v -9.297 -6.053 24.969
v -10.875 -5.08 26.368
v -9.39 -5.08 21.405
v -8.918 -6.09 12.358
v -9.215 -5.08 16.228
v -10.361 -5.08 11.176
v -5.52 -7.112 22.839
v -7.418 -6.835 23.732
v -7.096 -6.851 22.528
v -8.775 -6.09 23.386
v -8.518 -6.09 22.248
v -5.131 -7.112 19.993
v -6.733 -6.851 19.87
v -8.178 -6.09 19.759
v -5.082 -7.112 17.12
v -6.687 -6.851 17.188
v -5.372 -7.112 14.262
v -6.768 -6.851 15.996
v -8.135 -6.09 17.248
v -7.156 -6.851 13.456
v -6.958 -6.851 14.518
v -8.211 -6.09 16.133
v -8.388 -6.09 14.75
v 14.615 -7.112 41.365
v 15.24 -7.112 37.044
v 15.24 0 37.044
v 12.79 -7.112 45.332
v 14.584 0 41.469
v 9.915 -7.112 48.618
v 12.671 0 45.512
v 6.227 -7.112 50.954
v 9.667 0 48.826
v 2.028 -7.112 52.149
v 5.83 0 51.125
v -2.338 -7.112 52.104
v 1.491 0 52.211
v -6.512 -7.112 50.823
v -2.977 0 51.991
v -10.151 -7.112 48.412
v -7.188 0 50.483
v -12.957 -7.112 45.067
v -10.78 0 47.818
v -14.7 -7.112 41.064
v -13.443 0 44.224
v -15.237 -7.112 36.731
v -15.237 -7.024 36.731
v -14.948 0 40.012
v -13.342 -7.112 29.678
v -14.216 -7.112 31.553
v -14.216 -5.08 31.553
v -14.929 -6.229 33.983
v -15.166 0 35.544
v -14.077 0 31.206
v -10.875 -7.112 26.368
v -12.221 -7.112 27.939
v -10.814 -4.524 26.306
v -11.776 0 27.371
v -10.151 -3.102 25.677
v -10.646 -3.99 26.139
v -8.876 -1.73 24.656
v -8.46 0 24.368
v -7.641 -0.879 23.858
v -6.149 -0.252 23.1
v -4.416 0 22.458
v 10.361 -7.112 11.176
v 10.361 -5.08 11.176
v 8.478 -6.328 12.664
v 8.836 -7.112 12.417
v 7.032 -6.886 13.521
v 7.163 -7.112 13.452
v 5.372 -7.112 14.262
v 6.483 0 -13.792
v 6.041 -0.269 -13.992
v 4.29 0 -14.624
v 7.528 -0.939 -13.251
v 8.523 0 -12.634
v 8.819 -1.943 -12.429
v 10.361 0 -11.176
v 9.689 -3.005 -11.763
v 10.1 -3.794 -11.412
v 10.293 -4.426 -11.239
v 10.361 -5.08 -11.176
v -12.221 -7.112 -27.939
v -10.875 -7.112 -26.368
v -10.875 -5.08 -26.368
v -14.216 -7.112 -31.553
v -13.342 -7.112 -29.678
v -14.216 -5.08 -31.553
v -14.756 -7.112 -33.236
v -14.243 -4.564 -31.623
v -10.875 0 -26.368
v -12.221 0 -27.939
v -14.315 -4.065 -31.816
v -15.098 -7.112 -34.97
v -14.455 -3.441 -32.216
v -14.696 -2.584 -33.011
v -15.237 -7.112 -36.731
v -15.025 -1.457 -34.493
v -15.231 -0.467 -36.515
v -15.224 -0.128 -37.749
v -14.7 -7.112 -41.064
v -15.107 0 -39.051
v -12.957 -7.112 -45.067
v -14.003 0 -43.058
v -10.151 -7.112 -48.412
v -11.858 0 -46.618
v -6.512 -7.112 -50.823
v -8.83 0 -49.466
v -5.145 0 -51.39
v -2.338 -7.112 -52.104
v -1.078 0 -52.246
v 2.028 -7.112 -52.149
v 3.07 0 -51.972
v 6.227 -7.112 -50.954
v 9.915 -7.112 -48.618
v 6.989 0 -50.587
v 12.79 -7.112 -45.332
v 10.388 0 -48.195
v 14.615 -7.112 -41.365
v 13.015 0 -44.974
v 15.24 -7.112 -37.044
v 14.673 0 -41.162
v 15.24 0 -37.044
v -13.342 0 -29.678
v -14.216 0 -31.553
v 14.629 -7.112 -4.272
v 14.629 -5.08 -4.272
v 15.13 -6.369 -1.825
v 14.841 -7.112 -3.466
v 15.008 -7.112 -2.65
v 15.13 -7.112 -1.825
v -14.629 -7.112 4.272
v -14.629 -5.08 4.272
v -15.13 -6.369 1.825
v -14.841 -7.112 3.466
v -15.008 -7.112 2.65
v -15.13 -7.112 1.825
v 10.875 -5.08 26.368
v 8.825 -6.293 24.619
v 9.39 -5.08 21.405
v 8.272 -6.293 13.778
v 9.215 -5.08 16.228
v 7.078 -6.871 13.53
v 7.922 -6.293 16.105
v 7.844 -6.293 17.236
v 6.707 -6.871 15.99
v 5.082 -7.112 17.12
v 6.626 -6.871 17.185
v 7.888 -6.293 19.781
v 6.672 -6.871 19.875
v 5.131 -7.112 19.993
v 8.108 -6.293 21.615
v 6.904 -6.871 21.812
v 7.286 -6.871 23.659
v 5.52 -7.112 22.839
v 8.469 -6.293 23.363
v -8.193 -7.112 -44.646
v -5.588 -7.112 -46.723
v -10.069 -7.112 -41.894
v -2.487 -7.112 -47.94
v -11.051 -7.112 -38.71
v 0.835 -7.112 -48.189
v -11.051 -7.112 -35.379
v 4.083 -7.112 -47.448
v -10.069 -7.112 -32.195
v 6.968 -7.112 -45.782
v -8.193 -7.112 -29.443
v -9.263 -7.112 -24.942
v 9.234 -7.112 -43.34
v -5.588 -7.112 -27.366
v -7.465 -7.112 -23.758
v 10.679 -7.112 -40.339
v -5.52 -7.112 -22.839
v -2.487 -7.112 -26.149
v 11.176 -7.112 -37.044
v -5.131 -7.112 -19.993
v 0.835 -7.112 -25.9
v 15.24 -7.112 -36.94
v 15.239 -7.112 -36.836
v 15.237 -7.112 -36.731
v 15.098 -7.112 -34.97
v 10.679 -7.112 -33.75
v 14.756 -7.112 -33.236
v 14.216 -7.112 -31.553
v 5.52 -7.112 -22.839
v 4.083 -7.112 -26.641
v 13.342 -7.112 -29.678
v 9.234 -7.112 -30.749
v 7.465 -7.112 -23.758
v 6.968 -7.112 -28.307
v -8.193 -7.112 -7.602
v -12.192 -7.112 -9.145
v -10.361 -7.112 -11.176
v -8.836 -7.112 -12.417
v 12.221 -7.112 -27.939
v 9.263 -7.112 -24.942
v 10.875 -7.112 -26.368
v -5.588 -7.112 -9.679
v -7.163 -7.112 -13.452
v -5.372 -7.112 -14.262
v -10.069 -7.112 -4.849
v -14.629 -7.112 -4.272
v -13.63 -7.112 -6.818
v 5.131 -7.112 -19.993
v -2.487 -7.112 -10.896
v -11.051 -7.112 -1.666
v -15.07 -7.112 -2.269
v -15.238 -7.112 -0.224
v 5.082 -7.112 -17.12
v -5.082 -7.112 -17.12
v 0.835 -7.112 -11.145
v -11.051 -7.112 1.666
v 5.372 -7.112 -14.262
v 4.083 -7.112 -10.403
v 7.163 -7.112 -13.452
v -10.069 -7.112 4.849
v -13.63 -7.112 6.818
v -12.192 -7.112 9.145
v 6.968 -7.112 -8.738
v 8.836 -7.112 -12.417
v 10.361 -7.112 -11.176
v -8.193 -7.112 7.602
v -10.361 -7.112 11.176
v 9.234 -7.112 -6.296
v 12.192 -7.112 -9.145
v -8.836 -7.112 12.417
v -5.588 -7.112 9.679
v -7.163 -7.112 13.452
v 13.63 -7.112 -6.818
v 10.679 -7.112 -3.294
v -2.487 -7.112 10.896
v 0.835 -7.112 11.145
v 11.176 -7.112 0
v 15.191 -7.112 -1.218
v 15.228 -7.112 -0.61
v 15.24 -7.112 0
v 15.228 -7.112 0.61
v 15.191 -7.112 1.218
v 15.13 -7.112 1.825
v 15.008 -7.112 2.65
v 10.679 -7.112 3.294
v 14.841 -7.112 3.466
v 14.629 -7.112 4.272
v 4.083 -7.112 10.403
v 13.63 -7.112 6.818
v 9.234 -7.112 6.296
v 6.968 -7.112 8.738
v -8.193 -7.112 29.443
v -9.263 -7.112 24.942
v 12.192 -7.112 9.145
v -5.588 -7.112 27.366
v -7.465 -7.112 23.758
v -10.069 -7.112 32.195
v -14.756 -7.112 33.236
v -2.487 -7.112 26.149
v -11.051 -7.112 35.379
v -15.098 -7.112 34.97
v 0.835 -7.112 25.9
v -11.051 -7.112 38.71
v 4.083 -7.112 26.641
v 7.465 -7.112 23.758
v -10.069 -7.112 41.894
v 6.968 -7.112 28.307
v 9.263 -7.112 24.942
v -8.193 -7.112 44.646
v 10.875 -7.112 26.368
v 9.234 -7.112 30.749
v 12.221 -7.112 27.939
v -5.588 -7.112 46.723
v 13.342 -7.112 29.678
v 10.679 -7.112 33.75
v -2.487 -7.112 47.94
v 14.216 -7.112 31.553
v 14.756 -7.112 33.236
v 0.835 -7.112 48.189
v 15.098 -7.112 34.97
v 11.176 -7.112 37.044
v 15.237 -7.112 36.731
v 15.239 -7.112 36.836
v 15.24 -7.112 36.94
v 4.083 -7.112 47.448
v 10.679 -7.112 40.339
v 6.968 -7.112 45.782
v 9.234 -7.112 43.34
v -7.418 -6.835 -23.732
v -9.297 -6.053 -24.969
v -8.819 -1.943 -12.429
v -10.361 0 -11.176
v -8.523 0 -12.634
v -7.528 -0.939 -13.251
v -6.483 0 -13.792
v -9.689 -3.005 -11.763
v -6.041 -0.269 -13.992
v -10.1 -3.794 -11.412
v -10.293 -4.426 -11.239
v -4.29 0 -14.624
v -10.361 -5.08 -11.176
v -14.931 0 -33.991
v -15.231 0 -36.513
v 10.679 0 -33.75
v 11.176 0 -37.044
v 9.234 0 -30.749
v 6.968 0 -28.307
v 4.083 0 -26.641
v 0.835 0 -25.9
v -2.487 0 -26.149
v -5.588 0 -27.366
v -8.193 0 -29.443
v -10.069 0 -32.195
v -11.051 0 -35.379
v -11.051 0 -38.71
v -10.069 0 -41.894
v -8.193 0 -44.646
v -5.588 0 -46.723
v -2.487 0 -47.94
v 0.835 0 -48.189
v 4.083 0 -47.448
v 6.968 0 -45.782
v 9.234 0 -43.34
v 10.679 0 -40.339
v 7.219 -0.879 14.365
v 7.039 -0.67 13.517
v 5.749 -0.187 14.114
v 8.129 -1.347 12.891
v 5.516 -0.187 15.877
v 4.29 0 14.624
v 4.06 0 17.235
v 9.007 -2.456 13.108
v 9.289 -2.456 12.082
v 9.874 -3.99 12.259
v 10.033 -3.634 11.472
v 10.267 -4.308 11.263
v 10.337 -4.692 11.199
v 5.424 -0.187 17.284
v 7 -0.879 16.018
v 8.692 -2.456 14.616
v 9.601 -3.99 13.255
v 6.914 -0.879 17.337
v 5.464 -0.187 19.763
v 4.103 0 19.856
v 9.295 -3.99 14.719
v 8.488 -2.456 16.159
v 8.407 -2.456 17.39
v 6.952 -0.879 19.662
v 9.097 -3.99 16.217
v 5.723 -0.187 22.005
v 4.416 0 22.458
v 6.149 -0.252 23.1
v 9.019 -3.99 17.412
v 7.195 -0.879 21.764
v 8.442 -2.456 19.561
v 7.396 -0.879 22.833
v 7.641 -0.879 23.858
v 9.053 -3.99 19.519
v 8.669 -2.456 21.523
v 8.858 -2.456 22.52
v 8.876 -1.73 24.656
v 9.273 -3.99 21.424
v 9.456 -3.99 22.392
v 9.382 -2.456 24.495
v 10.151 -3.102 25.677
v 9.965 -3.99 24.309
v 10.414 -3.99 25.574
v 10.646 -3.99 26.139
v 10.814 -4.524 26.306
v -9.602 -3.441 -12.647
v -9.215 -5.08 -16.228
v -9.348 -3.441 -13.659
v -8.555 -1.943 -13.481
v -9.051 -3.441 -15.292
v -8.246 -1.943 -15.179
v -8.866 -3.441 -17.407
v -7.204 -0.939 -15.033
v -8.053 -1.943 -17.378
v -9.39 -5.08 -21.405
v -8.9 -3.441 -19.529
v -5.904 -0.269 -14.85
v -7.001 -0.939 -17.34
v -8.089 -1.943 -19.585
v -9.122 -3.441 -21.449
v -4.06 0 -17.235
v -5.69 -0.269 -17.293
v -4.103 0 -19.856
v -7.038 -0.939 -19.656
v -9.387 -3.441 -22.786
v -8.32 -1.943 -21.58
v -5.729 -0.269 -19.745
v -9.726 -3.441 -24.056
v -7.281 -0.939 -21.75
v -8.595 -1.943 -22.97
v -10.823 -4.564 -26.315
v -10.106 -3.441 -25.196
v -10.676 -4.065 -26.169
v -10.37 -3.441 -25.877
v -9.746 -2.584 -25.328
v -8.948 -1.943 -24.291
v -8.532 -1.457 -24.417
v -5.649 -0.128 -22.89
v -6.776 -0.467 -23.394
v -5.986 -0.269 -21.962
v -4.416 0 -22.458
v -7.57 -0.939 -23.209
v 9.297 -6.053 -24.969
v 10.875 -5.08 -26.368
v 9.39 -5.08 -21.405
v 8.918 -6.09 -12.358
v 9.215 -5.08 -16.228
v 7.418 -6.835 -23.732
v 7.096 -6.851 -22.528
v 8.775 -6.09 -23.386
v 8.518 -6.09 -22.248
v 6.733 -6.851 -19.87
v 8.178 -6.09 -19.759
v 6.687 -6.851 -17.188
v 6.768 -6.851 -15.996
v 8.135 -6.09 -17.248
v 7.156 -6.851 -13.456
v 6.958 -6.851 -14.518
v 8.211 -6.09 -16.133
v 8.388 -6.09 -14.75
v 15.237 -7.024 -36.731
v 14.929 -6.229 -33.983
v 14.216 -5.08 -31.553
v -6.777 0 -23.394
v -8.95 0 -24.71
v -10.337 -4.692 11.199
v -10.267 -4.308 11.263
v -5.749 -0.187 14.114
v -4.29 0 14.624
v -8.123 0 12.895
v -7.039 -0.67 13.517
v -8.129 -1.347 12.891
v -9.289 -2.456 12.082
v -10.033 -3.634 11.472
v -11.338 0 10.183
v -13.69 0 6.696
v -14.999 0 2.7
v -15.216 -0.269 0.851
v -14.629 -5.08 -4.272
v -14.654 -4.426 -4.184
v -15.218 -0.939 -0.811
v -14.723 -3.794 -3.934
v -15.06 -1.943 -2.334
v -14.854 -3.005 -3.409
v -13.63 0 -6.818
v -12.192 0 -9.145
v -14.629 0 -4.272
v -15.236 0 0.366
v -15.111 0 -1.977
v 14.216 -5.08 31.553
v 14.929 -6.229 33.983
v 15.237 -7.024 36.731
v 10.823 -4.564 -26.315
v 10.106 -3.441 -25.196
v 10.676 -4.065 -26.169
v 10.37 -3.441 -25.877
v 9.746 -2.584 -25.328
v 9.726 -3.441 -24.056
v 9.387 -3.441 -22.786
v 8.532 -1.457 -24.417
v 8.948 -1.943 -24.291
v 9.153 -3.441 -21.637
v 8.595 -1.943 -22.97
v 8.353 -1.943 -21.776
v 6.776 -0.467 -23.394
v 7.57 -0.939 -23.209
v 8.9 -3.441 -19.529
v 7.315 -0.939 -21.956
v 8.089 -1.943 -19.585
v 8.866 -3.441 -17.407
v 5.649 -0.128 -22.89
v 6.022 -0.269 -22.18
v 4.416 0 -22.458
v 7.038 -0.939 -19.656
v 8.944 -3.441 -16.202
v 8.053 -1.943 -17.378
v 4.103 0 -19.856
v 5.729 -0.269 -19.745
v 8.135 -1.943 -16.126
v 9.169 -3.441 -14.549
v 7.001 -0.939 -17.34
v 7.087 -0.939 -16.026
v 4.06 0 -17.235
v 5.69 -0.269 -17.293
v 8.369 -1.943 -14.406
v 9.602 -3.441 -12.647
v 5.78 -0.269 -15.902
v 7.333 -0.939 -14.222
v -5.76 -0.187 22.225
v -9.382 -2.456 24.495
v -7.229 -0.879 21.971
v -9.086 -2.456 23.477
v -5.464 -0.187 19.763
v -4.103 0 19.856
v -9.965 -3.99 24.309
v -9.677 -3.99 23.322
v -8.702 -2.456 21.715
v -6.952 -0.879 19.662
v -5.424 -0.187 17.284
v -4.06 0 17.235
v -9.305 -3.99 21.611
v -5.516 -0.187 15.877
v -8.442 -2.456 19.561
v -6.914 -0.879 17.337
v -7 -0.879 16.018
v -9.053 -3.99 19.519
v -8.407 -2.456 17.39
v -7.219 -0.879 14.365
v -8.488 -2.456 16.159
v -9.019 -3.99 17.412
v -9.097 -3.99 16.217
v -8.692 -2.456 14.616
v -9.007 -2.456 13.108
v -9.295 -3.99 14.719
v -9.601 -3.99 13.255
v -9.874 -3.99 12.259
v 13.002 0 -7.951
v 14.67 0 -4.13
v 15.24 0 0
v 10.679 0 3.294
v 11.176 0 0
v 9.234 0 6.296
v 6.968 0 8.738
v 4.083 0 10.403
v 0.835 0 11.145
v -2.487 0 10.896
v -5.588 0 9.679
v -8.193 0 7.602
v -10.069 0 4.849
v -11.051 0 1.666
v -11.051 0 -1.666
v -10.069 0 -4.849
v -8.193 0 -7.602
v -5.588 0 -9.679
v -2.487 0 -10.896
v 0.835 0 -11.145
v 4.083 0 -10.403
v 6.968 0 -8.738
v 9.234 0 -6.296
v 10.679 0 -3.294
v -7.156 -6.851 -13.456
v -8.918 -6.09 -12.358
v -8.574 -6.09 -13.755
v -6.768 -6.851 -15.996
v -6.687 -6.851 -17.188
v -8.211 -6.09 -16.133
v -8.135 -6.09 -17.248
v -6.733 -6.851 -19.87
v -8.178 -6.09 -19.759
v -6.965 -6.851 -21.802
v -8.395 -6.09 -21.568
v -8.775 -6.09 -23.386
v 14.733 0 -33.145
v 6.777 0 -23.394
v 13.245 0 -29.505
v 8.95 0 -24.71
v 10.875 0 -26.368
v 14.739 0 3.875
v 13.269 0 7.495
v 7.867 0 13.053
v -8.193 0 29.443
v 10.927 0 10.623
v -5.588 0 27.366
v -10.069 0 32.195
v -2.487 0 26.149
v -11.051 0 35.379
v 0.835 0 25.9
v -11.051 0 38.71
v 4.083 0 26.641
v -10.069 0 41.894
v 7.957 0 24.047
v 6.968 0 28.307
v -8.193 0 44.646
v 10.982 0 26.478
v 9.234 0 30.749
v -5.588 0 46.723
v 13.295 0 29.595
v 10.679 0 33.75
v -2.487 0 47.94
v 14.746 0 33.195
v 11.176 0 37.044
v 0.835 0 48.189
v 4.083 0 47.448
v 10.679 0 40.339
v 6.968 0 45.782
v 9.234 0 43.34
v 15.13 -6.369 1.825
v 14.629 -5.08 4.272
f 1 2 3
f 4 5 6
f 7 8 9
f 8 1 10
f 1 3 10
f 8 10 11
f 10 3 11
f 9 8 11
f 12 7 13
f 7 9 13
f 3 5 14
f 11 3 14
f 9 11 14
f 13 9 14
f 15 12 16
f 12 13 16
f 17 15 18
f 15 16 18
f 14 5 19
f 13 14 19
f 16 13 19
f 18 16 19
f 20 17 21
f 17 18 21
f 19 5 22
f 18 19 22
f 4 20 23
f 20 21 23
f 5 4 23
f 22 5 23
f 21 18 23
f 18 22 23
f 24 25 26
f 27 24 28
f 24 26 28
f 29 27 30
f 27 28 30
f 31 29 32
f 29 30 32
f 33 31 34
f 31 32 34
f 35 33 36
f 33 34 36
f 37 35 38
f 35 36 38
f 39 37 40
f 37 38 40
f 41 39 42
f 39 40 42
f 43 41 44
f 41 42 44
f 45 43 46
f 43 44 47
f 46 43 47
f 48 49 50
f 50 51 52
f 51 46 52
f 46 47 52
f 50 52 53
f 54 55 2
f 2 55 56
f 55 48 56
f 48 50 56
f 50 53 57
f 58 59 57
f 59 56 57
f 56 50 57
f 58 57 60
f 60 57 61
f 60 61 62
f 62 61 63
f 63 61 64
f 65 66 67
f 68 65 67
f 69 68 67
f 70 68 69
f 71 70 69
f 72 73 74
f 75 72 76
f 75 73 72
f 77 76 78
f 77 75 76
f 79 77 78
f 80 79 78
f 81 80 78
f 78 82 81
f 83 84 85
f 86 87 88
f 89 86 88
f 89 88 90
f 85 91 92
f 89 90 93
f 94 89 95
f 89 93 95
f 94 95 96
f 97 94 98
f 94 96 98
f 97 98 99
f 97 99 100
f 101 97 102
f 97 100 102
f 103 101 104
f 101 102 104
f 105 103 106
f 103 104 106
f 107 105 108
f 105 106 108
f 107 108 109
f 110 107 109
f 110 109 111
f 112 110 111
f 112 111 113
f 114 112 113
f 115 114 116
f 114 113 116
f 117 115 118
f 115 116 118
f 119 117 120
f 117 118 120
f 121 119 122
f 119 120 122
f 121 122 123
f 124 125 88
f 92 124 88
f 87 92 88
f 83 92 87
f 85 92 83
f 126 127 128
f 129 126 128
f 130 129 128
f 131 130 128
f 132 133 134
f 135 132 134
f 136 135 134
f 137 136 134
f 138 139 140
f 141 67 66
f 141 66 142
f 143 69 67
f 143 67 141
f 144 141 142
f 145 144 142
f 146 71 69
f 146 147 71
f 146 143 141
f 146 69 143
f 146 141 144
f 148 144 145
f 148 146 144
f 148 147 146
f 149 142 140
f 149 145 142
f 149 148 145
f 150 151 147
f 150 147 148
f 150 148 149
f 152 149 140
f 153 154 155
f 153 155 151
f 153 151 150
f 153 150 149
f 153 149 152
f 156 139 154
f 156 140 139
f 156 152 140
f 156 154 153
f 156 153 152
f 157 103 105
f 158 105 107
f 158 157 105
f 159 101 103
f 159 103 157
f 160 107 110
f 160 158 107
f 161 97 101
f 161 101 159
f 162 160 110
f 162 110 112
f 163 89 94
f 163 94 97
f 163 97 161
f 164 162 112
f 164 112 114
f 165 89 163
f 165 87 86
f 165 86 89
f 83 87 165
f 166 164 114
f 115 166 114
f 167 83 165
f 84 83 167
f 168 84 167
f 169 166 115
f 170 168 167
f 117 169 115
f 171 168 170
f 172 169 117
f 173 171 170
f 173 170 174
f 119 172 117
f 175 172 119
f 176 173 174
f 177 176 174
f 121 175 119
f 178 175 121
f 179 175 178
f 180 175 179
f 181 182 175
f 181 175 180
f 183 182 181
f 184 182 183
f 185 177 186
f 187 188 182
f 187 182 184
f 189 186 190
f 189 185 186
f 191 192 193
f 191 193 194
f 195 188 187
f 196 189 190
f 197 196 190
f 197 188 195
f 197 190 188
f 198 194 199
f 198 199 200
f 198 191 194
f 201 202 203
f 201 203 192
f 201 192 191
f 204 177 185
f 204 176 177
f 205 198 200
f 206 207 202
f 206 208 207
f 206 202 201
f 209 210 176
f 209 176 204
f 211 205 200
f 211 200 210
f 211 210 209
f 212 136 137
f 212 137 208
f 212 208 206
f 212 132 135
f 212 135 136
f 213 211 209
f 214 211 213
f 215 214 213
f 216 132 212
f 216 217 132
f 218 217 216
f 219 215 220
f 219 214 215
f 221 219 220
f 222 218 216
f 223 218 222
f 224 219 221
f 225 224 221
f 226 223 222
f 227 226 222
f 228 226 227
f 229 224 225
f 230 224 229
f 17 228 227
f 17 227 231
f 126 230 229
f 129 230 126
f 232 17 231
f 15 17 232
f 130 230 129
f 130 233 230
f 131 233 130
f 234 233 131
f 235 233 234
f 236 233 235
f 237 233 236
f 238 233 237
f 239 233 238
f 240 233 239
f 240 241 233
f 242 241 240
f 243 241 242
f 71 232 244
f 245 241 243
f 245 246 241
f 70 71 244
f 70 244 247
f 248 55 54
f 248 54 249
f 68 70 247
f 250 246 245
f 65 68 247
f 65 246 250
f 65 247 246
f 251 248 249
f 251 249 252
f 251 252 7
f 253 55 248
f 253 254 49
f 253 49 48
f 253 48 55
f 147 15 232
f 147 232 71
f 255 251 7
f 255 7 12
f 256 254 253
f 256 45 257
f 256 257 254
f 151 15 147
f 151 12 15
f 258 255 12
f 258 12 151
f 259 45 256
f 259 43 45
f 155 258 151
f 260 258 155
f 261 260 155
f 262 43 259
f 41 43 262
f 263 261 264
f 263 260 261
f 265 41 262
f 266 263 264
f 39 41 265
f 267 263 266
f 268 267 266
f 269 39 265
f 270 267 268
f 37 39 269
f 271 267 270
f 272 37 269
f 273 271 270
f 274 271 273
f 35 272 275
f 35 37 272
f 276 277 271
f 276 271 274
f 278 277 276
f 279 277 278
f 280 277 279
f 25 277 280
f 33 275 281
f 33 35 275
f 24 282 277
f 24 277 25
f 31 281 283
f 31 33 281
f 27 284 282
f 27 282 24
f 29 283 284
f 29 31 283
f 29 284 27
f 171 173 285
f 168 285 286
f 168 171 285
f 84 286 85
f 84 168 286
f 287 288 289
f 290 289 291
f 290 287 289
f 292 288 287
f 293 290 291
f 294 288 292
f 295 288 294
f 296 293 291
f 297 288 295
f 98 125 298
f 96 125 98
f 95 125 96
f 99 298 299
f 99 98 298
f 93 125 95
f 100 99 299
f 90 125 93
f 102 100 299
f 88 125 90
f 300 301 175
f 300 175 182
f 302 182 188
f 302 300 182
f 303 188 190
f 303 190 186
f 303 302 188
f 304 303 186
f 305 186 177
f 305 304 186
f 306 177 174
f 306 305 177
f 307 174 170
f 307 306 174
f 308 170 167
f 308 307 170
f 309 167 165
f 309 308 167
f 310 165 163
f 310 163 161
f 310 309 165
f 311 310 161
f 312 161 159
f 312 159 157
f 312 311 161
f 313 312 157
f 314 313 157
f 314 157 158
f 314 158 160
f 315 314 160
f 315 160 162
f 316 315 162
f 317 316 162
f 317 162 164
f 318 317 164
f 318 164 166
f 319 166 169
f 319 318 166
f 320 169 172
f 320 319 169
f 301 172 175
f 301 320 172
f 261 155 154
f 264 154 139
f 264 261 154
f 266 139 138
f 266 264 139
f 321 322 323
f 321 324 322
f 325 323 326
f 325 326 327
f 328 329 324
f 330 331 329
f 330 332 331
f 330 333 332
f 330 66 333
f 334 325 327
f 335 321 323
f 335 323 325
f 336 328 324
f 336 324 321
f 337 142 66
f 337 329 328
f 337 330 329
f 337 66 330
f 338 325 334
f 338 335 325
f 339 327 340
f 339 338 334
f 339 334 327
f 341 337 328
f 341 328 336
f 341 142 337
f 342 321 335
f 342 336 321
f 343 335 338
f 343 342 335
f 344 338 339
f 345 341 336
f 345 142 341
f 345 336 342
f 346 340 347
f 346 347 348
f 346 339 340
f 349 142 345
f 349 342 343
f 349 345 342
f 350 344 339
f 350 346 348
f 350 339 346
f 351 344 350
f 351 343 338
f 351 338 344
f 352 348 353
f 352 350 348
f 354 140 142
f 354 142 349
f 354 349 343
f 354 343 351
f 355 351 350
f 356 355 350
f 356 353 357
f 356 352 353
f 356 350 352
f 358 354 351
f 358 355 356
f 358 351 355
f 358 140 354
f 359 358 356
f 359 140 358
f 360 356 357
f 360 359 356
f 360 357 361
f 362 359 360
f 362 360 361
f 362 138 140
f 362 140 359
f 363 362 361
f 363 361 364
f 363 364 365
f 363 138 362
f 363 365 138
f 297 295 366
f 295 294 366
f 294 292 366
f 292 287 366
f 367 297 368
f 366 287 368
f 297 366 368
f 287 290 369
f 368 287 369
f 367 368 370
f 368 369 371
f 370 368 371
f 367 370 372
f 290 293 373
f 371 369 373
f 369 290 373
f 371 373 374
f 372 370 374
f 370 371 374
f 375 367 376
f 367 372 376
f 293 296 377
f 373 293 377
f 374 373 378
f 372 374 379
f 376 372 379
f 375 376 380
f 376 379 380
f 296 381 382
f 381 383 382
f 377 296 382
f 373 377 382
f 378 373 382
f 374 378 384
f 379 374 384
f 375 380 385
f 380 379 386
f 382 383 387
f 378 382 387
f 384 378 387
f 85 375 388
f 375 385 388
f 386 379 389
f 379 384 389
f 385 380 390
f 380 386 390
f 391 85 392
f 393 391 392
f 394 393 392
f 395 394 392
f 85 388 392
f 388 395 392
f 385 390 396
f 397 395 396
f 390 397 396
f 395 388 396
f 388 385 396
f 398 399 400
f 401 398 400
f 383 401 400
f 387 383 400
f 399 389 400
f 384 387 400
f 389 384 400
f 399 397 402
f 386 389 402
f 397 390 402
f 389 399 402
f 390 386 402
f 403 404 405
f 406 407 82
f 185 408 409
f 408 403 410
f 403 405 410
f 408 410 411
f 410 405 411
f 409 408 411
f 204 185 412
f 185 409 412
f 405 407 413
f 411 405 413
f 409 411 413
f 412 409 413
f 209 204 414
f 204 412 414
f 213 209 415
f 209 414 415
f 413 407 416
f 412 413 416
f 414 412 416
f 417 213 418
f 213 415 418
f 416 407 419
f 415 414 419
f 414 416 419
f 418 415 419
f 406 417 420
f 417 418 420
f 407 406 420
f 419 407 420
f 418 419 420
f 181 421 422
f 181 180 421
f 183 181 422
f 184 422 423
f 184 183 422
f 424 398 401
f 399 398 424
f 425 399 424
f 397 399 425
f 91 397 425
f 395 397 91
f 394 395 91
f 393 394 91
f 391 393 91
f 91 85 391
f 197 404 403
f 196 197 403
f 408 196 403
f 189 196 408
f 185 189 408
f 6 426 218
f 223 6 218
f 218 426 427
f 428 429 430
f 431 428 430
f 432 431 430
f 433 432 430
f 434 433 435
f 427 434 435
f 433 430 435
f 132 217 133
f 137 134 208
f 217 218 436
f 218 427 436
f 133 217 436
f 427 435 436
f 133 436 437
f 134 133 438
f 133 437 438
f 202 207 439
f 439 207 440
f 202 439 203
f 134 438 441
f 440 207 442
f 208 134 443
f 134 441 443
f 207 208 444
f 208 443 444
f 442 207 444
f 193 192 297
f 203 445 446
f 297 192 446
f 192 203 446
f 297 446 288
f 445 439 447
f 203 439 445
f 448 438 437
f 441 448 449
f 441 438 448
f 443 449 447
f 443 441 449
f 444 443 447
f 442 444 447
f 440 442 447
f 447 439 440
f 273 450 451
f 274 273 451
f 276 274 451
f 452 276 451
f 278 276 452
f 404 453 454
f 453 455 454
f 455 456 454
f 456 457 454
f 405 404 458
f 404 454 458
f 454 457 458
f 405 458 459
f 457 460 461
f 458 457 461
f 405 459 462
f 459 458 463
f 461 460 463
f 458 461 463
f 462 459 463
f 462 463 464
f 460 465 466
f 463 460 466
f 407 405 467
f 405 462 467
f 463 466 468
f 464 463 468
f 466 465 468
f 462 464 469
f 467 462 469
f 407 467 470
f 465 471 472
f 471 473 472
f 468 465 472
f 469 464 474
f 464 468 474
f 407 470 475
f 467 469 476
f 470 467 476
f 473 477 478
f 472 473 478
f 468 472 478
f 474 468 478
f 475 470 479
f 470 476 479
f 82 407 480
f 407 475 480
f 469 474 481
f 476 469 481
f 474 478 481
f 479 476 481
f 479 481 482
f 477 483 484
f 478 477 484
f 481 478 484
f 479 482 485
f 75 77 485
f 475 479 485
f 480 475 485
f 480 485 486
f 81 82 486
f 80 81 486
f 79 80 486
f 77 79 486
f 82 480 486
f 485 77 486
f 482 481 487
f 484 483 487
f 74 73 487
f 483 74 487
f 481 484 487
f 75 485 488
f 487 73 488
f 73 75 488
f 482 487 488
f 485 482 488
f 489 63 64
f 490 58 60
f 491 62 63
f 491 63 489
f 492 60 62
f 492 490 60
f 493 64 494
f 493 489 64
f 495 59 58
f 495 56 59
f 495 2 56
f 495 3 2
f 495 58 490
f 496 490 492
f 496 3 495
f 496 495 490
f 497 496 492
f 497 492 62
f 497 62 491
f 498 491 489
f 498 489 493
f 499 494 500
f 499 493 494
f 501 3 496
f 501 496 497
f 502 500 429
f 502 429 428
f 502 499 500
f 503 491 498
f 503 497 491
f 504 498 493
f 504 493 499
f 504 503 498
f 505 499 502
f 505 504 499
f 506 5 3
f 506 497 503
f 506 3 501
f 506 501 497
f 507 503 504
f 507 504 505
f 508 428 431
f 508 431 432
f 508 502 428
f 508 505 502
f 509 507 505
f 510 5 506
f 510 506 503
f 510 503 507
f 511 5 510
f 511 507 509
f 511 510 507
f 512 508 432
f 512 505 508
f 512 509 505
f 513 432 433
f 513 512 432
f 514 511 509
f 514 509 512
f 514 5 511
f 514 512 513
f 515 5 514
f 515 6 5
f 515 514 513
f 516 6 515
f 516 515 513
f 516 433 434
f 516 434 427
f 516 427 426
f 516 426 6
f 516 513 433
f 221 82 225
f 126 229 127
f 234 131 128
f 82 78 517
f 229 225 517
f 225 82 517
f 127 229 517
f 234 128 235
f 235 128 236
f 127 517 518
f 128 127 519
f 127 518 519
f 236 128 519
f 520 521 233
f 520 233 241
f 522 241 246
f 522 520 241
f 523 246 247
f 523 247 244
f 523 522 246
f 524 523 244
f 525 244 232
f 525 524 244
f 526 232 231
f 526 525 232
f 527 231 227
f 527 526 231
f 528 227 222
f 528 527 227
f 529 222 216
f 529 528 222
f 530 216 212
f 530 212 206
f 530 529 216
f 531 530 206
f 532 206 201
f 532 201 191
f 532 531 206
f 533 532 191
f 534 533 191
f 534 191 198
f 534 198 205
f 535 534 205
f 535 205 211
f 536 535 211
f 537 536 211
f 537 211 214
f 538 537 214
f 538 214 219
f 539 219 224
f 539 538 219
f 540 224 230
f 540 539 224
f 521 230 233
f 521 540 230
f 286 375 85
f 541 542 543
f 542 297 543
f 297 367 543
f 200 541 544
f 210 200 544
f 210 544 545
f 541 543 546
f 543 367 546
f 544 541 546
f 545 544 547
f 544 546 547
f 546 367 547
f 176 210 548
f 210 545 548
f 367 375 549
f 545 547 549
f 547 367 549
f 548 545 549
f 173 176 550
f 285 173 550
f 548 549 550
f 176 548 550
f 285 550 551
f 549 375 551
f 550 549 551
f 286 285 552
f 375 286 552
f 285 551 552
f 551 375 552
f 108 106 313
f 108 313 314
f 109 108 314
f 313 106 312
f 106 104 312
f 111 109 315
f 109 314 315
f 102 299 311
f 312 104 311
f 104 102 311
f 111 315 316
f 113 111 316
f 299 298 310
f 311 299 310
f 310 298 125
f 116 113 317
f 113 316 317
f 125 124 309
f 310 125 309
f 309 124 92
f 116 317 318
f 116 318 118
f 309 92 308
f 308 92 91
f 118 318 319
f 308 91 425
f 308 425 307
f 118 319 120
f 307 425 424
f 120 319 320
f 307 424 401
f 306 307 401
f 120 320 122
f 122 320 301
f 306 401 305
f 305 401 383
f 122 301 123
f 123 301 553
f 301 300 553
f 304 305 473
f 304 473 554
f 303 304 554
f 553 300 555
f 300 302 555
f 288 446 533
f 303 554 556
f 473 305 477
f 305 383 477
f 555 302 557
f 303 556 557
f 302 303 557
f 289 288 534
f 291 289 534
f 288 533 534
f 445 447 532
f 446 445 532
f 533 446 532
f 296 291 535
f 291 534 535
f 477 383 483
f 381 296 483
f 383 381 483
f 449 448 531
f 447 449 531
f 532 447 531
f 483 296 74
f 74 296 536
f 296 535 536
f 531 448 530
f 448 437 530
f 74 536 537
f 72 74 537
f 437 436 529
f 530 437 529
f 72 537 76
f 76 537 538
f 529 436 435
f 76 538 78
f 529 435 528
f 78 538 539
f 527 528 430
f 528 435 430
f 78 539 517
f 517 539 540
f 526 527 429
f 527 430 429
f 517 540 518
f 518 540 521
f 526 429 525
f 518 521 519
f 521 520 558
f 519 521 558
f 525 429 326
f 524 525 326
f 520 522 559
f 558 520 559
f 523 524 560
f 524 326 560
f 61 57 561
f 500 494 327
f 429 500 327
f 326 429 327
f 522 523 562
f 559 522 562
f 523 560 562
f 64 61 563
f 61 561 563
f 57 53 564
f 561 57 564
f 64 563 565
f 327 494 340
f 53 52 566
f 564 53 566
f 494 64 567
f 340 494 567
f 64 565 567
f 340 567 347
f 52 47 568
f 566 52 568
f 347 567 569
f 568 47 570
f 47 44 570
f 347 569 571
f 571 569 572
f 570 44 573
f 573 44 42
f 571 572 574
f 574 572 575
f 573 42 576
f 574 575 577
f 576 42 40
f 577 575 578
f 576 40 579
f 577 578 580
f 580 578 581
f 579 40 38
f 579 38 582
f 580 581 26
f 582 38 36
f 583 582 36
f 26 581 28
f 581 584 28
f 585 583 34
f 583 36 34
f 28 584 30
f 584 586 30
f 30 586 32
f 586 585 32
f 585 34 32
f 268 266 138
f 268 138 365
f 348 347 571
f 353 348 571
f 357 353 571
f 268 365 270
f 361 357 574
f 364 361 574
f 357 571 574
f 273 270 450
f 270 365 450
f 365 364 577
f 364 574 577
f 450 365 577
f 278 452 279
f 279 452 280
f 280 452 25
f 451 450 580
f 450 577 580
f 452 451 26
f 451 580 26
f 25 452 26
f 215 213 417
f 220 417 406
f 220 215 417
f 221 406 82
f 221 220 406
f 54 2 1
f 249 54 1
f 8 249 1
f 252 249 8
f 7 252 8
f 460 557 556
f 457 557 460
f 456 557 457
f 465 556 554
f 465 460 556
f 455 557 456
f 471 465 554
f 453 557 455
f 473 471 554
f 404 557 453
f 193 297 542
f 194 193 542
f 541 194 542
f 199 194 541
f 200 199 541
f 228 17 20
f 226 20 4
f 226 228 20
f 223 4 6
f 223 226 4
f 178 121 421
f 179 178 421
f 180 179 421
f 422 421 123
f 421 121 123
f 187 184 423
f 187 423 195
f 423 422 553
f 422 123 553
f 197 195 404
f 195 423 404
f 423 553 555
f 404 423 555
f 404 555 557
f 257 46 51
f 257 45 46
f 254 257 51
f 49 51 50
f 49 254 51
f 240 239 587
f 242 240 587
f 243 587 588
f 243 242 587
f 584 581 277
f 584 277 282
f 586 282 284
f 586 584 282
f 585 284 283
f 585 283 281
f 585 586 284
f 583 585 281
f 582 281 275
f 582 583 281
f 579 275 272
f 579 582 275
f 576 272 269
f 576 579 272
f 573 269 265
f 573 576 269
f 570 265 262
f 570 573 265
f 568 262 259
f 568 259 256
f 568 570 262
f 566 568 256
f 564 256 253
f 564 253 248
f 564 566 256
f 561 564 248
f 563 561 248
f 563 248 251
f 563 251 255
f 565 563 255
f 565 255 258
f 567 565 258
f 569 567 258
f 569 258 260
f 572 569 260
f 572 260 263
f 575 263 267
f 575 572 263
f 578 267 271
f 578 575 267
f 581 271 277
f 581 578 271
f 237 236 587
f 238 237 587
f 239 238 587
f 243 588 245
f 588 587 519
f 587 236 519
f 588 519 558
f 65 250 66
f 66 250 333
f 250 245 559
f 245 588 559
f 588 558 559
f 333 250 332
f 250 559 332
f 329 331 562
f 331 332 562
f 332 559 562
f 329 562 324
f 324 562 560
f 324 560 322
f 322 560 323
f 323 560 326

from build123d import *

# Parameters (mm, degrees)
F0_R         = 11.176
F1_DEPTH     = 7.112
F2_T4_ANGLE  = 116.1586222886
F2_S5_R      = 15.24
F2_T6_DEPTH  = 30
F2_S7_R      = 15.24
F2_T8_DEPTH  = 30
F2_T12_ANGLE = 116.1586222886
F2_S13_R     = 15.24
F2_T14_DEPTH = 30
F2_S15_R     = 15.24
F2_T16_DEPTH = 30
F3_R         = 5.08
F4_T4_ANGLE  = 101.759749901
F4_S5_R      = 15.24
F4_T6_DEPTH  = 23
F4_S7_R      = 15.24
F4_T8_DEPTH  = 23
F4_T12_ANGLE = 101.7597499017
F4_S13_R     = 15.24
F4_T14_DEPTH = 27
F4_S15_R     = 15.24
F4_T16_DEPTH = 27
F4_T20_ANGLE = 101.7597499014
F4_S21_R     = 15.24
F4_T22_DEPTH = 27
F4_S23_R     = 15.24
F4_T24_DEPTH = 27
F4_T28_ANGLE = 101.7597499014
F4_S29_R     = 15.24
F4_T30_DEPTH = 27
F4_S31_R     = 15.24
F4_T32_DEPTH = 27


# Not quite as in the source:
# - a fillet or chamfer that OpenCascade refuses, or shapes differently, is made with other operations: its cross-section is extruded or revolved along the edge and cut away or added


with BuildPart() as f1:
    # F0 (on Front) → F1 (new body)
    with BuildSketch(Plane.XZ):
        with BuildLine():
            ThreePointArc((10.3608125449, -11.1763662883), (13.9670394713, -6.0974919769), (15.24, 0))
            ThreePointArc((15.24, 0), (13.9670394713, 6.0974919769), (10.3608125449, 11.1763662883))
            ThreePointArc((10.3608125449, 11.1763662883), (0, 15.24), (-10.3608125449, 11.1763662883))
            ThreePointArc((-10.3608125449, 11.1763662883), (-15.24, 0), (-10.3608125449, -11.1763662883))
            ThreePointArc((-10.3608125449, -11.1763662883), (0, -15.24), (10.3608125449, -11.1763662883))
        make_face()
        Circle(F0_R, mode=Mode.SUBTRACT)
        with BuildLine():
            ThreePointArc((-10.3608125449, 11.1763662883), (0, 15.24), (10.3608125449, 11.1763662883))
            ThreePointArc((10.3608125449, 11.1763662883), (9.1357508424, 18.8221602784), (10.8748760535, 26.3676480303))
            ThreePointArc((10.8748760535, 26.3676480303), (0, 21.8044767177), (-10.8748760535, 26.3676480303))
            ThreePointArc((-10.8748760535, 26.3676480303), (-9.1357508424, 18.8221602784), (-10.3608125449, 11.1763662883))
        make_face()
        with BuildLine():
            ThreePointArc((10.8748760535, -26.3676480303), (9.1357508424, -18.8221602784), (10.3608125449, -11.1763662883))
            ThreePointArc((10.3608125449, -11.1763662883), (0, -15.24), (-10.3608125449, -11.1763662883))
            ThreePointArc((-10.3608125449, -11.1763662883), (-9.1357508424, -18.8221602784), (-10.8748760535, -26.3676480303))
            ThreePointArc((-10.8748760535, -26.3676480303), (0, -21.8044767177), (10.8748760535, -26.3676480303))
        make_face()
        with BuildLine():
            ThreePointArc((-10.8748760535, 26.3676480303), (0, 21.8044767177), (10.8748760535, 26.3676480303))
            ThreePointArc((10.8748760535, 26.3676480303), (14.1065713598, 31.2771337877), (15.24, 37.0444767177))
            ThreePointArc((15.24, 37.0444767177), (-5.76734293, 51.1510480775), (-10.8748760535, 26.3676480303))
        make_face()
        with Locations((0, 37.0444767177)):
            Circle(F0_R, mode=Mode.SUBTRACT)
        with BuildLine():
            ThreePointArc((15.24, -37.0444767177), (14.1065713598, -31.2771337877), (10.8748760535, -26.3676480303))
            ThreePointArc((10.8748760535, -26.3676480303), (0, -21.8044767177), (-10.8748760535, -26.3676480303))
            ThreePointArc((-10.8748760535, -26.3676480303), (-5.76734293, -51.1510480775), (15.24, -37.0444767177))
        make_face()
        with Locations((0, -37.0444767177)):
            Circle(F0_R, mode=Mode.SUBTRACT)
    extrude(amount=F1_DEPTH)

    # F2: fillet of radius 5.08 on 2 edges, made by hand


with BuildPart() as f2_tool2:
    # F2_s3 → F2_t4 (revolve)
    with BuildSketch(Plane(origin=(29.8644460088, 0, -17.2301380427), x_dir=(0, 1, 0), z_dir=(0.8661774261, 0, -0.4997365971))):
        with BuildLine():
            ThreePointArc((-5.08, -21.2648569422), (-1.4878975516, -22.7527544938), (0, -26.3448569422))
            Line((0, -26.3448569422), (0, -21.2648569422))
            Line((0, -21.2648569422), (-5.08, -21.2648569422))
        make_face()
    revolve(axis=Axis((29.340401561, 0, -18.1384474874), (0, 1, 0)), revolution_arc=F2_T4_ANGLE)

    # F2_s5 → F2_t6 (cut, symmetric)
    with BuildSketch(Plane.XZ.offset(2.5)):
        with Locations((0, -37.0444767177)):
            Circle(F2_S5_R)
    extrude(amount=F2_T6_DEPTH, both=True, mode=Mode.SUBTRACT)

    # F2_s7 → F2_t8 (cut, symmetric)
    with BuildSketch(Plane.XZ.offset(2.5)):
        Circle(F2_S7_R)
    extrude(amount=F2_T8_DEPTH, both=True, mode=Mode.SUBTRACT)


with BuildPart() as f1_1:
    add(f1.part)

    # F2_t1: cut F2_tool2
    add(f2_tool2.part, mode=Mode.SUBTRACT)


with BuildPart() as f2_tool10:
    # F2_s11 → F2_t12 (revolve)
    with BuildSketch(Plane(origin=(-11.8407369211, 0, 7.9442927806), x_dir=(0, 1, 0), z_dir=(-0.8304131044, 0, 0.5571481635))):
        with BuildLine():
            ThreePointArc((-5.08, 11.1931397161), (-1.4878975516, 9.7052421646), (0, 6.1131397161))
            Line((0, 6.1131397161), (0, 11.1931397161))
            Line((0, 11.1931397161), (-5.08, 11.1931397161))
        make_face()
    revolve(axis=Axis((-29.340401561, 0, -18.1384474874), (0, 1, 0)), revolution_arc=F2_T12_ANGLE)

    # F2_s13 → F2_t14 (cut, symmetric)
    with BuildSketch(Plane.XZ.offset(4.3)):
        Circle(F2_S13_R)
    extrude(amount=F2_T14_DEPTH, both=True, mode=Mode.SUBTRACT)

    # F2_s15 → F2_t16 (cut, symmetric)
    with BuildSketch(Plane.XZ.offset(4.3)):
        with Locations((0, -37.0444767177)):
            Circle(F2_S15_R)
    extrude(amount=F2_T16_DEPTH, both=True, mode=Mode.SUBTRACT)


with BuildPart() as f1_2:
    add(f1_1.part)

    # F2_t9: cut F2_tool10
    add(f2_tool10.part, mode=Mode.SUBTRACT)

    # F3#2 (call 1 of 2: OpenCascade refuses the feature's edges together)
    f3_2_edges = [f1_2.edges().sort_by_distance(p)[0] for p in [
        (-9.135751, 0, 18.82216),
    ]]
    fillet(f3_2_edges, radius=F3_R)

    # F3 (call 2 of 2)
    f3_edges = [f1_2.edges().sort_by_distance(p)[0] for p in [
        (9.135751, 0, 18.82216),
    ]]
    fillet(f3_edges, radius=F3_R)

    # F4: fillet of radius 5.08 on 4 edges, made by hand


with BuildPart() as f4_tool2:
    # F4_s3 → F4_t4 (revolve)
    with BuildSketch(Plane(origin=(27.3577839274, 0, -20.7521533482), x_dir=(0, 1, 0), z_dir=(0.7967197018, 0, -0.6043490025))):
        with BuildLine():
            ThreePointArc((-7.112, -20.9996316731), (-6.5756901303, -18.727786608), (-5.08, -16.9356316731))
            Line((-5.08, -16.9356316731), (-7.112, -16.9356316732))
            Line((-7.112, -16.9356316732), (-7.112, -20.9996316731))
        make_face()
    revolve(axis=Axis((29.340401561, -7.112, -18.1384474874), (0, 1, 0)), revolution_arc=F4_T4_ANGLE)

    # F4_s5 → F4_t6 (cut, symmetric)
    with BuildSketch(Plane.XZ.offset(4.6)):
        Circle(F4_S5_R)
    extrude(amount=F4_T6_DEPTH, both=True, mode=Mode.SUBTRACT)

    # F4_s7 → F4_t8 (cut, symmetric)
    with BuildSketch(Plane.XZ.offset(4.6)):
        with Locations((0, -37.0444767177)):
            Circle(F4_S7_R)
    extrude(amount=F4_T8_DEPTH, both=True, mode=Mode.SUBTRACT)


with BuildPart() as f1_3:
    add(f1_2.part)

    # F4_t1: cut F4_tool2
    add(f4_tool2.part, mode=Mode.SUBTRACT)


with BuildPart() as f4_tool10:
    # F4_s11 → F4_t12 (revolve)
    with BuildSketch(Plane(origin=(-7.6988506956, 0, 6.7062600285), x_dir=(0, 1, 0), z_dir=(-0.7540423315, 0, 0.6568258234))):
        with BuildLine():
            ThreePointArc((-7.112, 8.6684750316), (-6.5756901303, 10.9403200968), (-5.08, 12.7324750316))
            Line((-5.08, 12.7324750316), (-7.112, 12.7324750316))
            Line((-7.112, 12.7324750316), (-7.112, 8.6684750316))
        make_face()
    revolve(axis=Axis((-29.340401561, -7.112, -18.1384474874), (0, 1, 0)), revolution_arc=F4_T12_ANGLE)

    # F4_s13 → F4_t14 (cut, symmetric)
    with BuildSketch(Plane.XZ.offset(4.6)):
        with Locations((0, -37.0444767177)):
            Circle(F4_S13_R)
    extrude(amount=F4_T14_DEPTH, both=True, mode=Mode.SUBTRACT)

    # F4_s15 → F4_t16 (cut, symmetric)
    with BuildSketch(Plane.XZ.offset(4.6)):
        Circle(F4_S15_R)
    extrude(amount=F4_T16_DEPTH, both=True, mode=Mode.SUBTRACT)


with BuildPart() as f1_4:
    add(f1_3.part)

    # F4_t9: cut F4_tool10
    add(f4_tool10.part, mode=Mode.SUBTRACT)


with BuildPart() as f4_tool18:
    # F4_s19 → F4_t20 (revolve)
    with BuildSketch(Plane(origin=(-27.3577839275, 0, 20.7521533481), x_dir=(0, 1, 0), z_dir=(-0.7967197018, 0, 0.6043490025))):
        with BuildLine():
            ThreePointArc((-7.112, -20.9996316733), (-6.5756901303, -18.7277866081), (-5.08, -16.9356316733))
            Line((-5.08, -16.9356316733), (-7.112, -16.9356316733))
            Line((-7.112, -16.9356316733), (-7.112, -20.9996316733))
        make_face()
    revolve(axis=Axis((-29.340401561, -7.112, 18.1384474874), (0, 1, 0)), revolution_arc=F4_T20_ANGLE)

    # F4_s21 → F4_t22 (cut, symmetric)
    with BuildSketch(Plane.XZ.offset(4.6)):
        with Locations((0, 37.0444767177)):
            Circle(F4_S21_R)
    extrude(amount=F4_T22_DEPTH, both=True, mode=Mode.SUBTRACT)

    # F4_s23 → F4_t24 (cut, symmetric)
    with BuildSketch(Plane.XZ.offset(4.6)):
        Circle(F4_S23_R)
    extrude(amount=F4_T24_DEPTH, both=True, mode=Mode.SUBTRACT)


with BuildPart() as f1_5:
    add(f1_4.part)

    # F4_t17: cut F4_tool18
    add(f4_tool18.part, mode=Mode.SUBTRACT)


with BuildPart() as f4_tool26:
    # F4_s27 → F4_t28 (revolve)
    with BuildSketch(Plane(origin=(7.6988506955, 0, -6.7062600285), x_dir=(0, 1, 0), z_dir=(0.7540423315, 0, -0.6568258234))):
        with BuildLine():
            ThreePointArc((-5.08, 12.7324750317), (-6.5756901303, 10.9403200968), (-7.112, 8.6684750317))
            Line((-7.112, 8.6684750317), (-7.112, 12.7324750317))
            Line((-7.112, 12.7324750317), (-5.08, 12.7324750317))
        make_face()
    revolve(axis=Axis((29.340401561, -7.112, 18.1384474874), (0, 1, 0)), revolution_arc=F4_T28_ANGLE)

    # F4_s29 → F4_t30 (cut, symmetric)
    with BuildSketch(Plane.XZ.offset(4.6)):
        Circle(F4_S29_R)
    extrude(amount=F4_T30_DEPTH, both=True, mode=Mode.SUBTRACT)

    # F4_s31 → F4_t32 (cut, symmetric)
    with BuildSketch(Plane.XZ.offset(4.6)):
        with Locations((0, 37.0444767177)):
            Circle(F4_S31_R)
    extrude(amount=F4_T32_DEPTH, both=True, mode=Mode.SUBTRACT)


with BuildPart() as f1_6:
    add(f1_5.part)

    # F4_t25: cut F4_tool26
    add(f4_tool26.part, mode=Mode.SUBTRACT)


solid = f1_6.part
